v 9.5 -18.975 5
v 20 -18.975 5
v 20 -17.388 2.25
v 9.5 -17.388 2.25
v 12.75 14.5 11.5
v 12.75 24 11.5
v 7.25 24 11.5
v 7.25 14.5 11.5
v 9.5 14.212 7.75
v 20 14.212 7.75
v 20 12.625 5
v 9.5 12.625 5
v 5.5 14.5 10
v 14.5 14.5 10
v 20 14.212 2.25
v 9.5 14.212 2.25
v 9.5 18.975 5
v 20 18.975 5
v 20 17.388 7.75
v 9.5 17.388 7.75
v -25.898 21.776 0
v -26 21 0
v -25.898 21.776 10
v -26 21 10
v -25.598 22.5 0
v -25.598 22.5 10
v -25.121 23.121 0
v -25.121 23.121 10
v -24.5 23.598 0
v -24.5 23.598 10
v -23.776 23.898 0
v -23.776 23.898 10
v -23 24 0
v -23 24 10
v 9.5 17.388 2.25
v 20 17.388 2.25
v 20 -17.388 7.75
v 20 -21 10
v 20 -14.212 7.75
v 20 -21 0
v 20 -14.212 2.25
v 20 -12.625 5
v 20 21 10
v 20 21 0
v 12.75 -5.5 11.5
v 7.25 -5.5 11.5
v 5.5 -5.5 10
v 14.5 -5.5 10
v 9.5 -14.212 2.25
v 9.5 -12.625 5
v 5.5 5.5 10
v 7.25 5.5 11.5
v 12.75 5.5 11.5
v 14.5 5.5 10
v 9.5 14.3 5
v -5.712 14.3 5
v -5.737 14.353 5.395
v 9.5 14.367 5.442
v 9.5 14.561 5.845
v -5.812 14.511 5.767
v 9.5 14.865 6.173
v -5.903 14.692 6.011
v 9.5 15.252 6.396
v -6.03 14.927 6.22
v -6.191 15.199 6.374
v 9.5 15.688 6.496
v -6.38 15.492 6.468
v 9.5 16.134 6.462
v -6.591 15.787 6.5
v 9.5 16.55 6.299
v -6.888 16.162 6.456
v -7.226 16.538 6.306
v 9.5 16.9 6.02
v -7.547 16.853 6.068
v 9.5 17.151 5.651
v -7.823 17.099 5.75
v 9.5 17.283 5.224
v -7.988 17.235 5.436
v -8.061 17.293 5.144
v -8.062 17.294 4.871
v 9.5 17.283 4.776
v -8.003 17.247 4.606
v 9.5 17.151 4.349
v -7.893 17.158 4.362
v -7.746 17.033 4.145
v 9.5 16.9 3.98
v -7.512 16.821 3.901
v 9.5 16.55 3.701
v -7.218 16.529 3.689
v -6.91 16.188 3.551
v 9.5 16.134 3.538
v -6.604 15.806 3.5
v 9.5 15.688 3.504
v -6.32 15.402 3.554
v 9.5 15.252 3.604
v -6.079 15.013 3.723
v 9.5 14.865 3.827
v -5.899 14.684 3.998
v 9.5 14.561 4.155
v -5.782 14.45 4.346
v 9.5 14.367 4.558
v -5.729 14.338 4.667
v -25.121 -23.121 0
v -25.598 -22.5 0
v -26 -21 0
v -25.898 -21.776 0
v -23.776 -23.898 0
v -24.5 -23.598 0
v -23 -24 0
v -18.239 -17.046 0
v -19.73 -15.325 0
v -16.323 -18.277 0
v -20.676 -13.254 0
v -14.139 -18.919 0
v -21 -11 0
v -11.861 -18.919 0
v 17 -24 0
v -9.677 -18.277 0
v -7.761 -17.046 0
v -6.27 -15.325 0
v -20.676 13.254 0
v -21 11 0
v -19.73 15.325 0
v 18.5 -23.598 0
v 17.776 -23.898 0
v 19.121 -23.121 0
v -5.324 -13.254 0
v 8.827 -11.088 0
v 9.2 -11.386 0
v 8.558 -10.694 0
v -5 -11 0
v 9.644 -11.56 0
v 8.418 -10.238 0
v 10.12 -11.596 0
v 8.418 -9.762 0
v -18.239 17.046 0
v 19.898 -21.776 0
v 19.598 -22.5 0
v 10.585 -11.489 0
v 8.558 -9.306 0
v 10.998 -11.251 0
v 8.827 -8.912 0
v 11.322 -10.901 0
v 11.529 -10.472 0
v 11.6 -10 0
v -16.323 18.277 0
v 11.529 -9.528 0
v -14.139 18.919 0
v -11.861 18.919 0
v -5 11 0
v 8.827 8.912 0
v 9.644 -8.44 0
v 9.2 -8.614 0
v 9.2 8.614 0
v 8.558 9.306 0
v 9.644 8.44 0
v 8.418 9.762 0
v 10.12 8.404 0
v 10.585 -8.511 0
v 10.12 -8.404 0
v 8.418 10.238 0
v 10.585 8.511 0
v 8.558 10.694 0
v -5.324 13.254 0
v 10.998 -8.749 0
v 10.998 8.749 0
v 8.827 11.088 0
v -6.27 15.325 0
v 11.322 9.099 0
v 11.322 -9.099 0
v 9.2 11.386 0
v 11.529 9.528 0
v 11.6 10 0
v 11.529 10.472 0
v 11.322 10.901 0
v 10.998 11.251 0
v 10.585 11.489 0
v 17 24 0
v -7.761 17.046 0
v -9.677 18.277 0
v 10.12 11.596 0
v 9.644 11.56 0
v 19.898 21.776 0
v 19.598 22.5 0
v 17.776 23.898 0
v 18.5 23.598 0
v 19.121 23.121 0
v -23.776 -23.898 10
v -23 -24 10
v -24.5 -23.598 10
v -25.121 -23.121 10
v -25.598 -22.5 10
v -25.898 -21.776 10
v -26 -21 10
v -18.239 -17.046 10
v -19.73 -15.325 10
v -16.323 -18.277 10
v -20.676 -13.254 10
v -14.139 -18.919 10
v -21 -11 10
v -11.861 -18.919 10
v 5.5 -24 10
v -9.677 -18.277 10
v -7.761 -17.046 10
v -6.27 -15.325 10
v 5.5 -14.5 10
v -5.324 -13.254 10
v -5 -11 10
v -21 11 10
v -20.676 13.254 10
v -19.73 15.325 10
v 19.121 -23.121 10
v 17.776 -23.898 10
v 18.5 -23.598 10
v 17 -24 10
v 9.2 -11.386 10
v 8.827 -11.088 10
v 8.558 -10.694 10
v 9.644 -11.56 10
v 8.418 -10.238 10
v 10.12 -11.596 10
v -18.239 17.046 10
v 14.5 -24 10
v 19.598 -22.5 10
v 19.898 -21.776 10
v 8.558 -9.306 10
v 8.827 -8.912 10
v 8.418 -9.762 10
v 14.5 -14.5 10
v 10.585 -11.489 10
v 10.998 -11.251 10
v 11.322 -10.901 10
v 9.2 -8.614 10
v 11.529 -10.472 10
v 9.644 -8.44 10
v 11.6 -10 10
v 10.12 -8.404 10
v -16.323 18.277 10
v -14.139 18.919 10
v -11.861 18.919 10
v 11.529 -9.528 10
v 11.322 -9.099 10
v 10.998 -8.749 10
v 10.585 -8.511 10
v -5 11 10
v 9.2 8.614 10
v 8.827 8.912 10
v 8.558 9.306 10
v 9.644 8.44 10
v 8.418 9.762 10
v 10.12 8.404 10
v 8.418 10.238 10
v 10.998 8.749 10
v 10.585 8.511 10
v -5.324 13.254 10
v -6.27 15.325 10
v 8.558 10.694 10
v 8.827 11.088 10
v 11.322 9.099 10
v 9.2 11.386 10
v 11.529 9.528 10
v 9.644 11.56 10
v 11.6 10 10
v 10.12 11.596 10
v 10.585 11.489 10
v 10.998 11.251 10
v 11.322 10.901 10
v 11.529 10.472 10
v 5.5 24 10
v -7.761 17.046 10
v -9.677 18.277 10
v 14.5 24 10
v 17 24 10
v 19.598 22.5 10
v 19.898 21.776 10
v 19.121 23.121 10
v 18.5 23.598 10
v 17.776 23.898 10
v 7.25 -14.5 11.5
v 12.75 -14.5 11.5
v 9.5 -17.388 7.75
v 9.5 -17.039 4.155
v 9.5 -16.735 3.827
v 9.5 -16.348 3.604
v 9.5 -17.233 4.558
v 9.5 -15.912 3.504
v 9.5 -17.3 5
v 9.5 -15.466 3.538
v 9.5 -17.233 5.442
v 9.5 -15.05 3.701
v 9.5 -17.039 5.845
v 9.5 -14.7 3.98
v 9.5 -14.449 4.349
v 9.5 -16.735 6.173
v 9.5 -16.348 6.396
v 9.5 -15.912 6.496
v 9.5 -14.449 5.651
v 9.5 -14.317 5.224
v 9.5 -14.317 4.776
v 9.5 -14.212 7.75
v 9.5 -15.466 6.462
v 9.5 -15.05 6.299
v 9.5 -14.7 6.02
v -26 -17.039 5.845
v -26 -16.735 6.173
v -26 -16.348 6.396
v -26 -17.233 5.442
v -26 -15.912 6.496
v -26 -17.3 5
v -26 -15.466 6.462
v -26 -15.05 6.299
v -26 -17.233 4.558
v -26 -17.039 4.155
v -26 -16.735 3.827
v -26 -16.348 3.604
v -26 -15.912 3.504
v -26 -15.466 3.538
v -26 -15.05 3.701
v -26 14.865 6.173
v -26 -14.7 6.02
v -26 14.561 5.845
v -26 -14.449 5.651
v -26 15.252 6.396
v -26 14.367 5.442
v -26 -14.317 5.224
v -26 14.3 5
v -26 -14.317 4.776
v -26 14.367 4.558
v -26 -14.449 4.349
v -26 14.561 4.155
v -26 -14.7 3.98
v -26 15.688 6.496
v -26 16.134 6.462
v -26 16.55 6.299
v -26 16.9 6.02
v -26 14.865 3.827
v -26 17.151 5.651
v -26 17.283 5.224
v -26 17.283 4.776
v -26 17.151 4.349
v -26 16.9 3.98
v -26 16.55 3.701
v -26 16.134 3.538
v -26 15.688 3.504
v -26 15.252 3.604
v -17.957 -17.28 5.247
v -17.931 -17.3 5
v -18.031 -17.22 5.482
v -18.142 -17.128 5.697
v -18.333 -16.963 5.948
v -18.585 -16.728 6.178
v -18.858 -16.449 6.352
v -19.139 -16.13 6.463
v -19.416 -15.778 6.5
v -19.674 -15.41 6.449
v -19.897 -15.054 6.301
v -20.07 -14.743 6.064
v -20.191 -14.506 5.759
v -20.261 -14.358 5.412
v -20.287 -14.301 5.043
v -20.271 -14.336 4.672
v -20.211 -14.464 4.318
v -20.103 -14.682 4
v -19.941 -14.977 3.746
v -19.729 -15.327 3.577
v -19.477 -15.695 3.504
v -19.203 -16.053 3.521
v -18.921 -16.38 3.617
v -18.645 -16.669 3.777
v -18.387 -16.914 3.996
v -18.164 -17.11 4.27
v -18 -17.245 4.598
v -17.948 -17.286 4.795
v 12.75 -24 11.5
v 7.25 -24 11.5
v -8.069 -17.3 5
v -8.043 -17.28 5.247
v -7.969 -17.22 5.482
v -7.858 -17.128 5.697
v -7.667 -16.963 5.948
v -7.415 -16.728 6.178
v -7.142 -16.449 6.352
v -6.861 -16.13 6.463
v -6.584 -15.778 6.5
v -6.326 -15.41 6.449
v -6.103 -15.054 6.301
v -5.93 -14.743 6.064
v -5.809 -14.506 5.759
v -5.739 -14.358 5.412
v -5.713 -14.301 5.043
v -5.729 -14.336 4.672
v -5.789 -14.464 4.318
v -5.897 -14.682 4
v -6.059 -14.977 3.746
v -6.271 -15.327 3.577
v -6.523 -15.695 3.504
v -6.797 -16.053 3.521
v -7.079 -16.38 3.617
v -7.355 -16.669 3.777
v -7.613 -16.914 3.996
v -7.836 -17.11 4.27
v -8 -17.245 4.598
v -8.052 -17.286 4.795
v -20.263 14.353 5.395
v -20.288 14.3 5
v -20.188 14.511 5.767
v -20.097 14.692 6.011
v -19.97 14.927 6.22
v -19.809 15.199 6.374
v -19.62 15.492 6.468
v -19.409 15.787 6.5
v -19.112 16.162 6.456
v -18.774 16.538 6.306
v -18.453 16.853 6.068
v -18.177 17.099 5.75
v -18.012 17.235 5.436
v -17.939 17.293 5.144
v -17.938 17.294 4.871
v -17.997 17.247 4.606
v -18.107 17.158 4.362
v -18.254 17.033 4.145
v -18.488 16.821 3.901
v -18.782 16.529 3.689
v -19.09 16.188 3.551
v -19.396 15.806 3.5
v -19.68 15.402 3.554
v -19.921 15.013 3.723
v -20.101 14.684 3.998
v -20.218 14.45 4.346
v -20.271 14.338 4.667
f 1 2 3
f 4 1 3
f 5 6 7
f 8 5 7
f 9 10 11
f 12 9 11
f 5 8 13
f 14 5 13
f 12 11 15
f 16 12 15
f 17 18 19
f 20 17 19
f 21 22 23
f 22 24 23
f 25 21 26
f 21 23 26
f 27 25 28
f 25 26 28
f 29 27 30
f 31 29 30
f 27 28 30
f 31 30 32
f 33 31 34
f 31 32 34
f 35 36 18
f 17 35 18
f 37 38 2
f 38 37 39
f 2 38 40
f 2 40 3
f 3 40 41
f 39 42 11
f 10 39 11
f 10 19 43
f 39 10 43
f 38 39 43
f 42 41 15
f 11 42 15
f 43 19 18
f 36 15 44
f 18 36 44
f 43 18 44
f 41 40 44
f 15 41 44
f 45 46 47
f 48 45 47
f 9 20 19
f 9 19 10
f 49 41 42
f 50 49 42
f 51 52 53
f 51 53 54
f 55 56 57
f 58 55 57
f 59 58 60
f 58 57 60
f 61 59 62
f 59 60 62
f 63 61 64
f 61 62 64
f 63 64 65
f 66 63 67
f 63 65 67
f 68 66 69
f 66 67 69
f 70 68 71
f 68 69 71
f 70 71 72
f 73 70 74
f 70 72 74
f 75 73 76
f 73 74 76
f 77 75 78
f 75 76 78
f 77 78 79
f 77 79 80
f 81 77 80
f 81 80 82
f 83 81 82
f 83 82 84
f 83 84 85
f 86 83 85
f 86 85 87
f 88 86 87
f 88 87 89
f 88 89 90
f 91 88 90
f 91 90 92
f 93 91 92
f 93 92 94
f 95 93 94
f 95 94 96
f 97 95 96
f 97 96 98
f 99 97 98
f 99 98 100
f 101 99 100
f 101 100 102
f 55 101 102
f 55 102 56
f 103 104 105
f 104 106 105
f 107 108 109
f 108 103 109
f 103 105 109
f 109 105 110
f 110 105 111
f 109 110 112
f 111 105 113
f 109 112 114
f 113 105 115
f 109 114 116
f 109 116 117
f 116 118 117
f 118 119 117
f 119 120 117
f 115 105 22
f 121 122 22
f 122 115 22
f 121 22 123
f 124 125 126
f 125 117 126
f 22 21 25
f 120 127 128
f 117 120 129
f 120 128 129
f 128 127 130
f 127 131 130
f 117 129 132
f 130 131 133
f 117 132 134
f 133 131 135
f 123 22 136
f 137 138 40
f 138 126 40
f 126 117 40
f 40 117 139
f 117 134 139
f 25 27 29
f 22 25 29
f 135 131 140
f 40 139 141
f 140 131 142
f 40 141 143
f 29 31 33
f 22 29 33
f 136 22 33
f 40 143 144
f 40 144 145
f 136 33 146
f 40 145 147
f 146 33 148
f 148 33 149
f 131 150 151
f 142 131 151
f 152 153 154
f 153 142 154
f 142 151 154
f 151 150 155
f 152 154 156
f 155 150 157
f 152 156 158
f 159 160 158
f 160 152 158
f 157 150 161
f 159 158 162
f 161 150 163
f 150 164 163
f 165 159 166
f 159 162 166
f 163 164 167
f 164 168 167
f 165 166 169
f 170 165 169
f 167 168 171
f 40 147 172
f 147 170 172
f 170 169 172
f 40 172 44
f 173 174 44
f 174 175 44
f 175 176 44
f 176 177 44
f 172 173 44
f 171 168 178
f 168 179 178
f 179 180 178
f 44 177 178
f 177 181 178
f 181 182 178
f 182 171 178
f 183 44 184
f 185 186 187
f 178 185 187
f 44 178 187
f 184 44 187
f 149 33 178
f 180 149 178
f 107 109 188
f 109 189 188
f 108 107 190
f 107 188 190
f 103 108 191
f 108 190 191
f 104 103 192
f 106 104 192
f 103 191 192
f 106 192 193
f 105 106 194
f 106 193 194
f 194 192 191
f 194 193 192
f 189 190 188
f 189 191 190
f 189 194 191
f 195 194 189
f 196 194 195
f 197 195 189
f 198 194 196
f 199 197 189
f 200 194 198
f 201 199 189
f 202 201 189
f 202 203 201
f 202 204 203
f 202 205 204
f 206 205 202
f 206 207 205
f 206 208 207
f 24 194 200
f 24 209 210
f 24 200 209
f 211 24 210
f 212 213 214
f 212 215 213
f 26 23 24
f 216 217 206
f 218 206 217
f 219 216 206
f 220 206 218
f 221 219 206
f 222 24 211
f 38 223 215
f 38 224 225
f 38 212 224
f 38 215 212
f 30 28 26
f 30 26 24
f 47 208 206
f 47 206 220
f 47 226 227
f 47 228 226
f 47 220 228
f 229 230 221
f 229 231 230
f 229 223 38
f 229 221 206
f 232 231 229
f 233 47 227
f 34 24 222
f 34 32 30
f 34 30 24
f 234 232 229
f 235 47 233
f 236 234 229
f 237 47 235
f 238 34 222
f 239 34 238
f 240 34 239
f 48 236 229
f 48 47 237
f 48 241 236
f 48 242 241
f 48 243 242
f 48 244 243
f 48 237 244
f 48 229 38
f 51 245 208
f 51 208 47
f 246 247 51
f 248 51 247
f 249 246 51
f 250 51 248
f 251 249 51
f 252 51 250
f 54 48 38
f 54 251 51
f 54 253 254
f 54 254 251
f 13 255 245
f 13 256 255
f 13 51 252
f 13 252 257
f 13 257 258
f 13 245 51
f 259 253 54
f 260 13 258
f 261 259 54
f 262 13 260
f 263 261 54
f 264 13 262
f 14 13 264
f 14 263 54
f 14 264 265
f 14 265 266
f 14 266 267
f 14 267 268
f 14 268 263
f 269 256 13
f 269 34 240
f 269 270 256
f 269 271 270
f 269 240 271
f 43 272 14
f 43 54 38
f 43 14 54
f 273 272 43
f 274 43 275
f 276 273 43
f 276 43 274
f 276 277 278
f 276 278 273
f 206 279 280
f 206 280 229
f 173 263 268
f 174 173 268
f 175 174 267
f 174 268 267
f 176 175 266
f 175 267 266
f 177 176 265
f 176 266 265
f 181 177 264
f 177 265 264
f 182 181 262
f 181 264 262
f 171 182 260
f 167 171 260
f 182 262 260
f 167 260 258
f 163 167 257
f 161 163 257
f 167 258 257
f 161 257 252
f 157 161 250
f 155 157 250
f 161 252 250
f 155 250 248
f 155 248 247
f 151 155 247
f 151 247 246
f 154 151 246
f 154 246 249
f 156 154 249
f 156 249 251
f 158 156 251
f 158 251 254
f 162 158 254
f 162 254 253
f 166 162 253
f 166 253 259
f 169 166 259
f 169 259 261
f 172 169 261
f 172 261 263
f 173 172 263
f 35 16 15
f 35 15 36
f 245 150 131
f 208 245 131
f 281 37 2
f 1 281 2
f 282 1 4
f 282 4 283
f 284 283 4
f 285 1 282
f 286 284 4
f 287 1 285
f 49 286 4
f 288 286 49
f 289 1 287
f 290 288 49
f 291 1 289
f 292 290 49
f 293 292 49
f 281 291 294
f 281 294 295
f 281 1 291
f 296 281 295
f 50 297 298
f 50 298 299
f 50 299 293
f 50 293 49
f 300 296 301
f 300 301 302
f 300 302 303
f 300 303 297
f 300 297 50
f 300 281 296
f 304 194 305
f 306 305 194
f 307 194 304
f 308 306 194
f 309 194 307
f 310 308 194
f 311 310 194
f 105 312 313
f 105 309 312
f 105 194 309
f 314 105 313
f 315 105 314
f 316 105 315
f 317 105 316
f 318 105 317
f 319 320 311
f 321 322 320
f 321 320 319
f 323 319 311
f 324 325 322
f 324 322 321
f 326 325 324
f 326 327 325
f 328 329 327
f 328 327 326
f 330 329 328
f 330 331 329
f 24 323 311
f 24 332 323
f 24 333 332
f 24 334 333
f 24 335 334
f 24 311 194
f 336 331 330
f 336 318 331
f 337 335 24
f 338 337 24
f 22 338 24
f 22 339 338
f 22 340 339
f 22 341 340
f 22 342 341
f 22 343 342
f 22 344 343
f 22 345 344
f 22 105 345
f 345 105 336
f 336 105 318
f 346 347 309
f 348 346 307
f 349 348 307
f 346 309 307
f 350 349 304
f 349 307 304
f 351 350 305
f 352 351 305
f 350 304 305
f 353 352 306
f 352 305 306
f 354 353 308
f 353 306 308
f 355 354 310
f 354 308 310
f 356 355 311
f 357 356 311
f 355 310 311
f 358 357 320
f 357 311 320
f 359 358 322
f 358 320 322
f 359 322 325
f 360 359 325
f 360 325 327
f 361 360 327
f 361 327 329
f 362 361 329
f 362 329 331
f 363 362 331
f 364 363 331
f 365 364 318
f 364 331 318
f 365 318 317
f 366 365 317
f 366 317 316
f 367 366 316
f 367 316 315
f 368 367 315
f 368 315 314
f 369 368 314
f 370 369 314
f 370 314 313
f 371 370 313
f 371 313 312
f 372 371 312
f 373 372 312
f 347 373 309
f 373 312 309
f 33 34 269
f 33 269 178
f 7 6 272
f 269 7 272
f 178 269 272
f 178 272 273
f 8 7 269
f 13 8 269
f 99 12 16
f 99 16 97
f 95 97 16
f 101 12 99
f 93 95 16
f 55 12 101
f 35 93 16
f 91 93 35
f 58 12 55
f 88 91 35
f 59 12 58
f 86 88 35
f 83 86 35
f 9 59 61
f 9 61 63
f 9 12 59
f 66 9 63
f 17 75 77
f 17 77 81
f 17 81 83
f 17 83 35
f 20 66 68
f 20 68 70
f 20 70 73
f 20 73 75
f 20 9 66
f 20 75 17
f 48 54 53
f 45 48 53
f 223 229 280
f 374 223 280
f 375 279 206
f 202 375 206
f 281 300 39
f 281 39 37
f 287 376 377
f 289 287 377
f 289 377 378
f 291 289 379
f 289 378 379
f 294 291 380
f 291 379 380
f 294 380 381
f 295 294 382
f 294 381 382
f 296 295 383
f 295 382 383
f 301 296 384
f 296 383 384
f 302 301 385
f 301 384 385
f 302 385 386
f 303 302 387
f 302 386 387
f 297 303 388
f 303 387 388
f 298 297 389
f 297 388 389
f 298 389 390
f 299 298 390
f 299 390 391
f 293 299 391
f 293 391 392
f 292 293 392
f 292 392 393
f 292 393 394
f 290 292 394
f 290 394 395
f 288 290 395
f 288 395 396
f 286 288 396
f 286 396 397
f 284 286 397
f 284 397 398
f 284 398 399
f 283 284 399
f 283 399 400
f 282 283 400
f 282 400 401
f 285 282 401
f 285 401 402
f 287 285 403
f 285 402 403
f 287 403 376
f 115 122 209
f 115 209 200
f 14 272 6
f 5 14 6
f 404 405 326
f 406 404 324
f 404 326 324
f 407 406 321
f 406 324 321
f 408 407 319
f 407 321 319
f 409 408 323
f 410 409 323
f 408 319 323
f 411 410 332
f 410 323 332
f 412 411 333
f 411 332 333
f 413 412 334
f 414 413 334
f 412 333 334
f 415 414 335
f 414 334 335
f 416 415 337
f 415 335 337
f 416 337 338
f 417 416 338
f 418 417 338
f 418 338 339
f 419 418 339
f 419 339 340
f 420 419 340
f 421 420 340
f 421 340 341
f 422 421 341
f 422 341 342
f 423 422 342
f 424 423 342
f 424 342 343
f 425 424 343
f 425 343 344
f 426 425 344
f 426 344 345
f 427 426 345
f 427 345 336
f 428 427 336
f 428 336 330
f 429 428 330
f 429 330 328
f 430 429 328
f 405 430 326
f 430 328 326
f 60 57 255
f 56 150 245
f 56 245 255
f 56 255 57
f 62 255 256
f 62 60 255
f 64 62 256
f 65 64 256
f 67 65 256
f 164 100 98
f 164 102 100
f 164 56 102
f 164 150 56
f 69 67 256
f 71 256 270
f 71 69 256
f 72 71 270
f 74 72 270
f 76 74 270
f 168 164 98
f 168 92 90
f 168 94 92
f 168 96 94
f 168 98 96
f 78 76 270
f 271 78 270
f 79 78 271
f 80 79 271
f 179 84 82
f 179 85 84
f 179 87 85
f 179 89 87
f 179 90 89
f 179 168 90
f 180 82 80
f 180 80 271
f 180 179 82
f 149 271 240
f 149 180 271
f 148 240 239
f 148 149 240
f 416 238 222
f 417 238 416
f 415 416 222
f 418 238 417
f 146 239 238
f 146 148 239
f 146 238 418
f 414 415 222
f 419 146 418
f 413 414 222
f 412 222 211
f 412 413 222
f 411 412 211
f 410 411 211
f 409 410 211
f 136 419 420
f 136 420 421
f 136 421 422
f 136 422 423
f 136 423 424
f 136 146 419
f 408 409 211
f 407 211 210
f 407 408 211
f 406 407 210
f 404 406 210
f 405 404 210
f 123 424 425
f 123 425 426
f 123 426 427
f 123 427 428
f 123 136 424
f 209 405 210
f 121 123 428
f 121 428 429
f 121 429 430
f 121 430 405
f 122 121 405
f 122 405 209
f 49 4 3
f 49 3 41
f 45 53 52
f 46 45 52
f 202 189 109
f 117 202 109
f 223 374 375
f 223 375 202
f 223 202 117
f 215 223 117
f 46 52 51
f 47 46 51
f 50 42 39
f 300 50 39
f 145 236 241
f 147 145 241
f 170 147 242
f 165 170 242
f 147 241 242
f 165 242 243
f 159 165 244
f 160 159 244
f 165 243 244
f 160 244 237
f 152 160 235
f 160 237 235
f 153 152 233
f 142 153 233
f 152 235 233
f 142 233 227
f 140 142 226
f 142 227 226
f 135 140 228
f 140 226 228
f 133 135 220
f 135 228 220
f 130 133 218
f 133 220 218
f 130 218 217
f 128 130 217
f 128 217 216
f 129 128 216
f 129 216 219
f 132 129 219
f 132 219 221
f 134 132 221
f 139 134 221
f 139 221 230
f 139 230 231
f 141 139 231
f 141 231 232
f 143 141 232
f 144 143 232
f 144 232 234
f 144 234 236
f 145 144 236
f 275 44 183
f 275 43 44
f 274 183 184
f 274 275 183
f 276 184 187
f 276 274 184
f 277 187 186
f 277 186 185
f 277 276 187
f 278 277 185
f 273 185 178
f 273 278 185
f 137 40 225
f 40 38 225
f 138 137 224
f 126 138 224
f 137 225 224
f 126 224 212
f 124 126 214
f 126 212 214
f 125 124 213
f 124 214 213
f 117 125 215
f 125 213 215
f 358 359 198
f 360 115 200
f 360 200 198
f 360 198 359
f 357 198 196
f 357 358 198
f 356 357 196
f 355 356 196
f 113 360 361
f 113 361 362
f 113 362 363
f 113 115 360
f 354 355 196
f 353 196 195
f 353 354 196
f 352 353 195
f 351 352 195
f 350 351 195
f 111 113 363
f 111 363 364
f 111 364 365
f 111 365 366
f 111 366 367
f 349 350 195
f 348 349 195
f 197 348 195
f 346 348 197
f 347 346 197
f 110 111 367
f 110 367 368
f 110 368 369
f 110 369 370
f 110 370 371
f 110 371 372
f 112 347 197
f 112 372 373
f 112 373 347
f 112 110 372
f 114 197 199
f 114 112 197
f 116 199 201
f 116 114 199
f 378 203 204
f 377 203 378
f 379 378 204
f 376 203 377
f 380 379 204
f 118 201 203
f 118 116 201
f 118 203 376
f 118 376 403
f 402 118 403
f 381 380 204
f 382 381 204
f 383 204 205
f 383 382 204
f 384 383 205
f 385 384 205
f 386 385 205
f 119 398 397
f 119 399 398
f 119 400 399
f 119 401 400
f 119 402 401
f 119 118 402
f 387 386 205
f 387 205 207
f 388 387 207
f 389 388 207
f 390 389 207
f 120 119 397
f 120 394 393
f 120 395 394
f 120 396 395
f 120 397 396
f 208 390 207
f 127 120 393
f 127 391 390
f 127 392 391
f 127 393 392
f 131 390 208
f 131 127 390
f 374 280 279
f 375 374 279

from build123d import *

# Parameters (mm, degrees)
SKETCH_W        = 46
SKETCH_H        = 48
PAD_DEPTH       = 10
SKETCH001_R     = 1.5
POCKET_DEPTH    = 46.001
SKETCH002_R     = 1.6
POCKET001_DEPTH = 10.001
PAD001_DEPTH    = 48
PAD001_FACE20_R = 1.6
POCKET002_DEPTH = 1.501
SKETCH004_W     = 9
SKETCH004_H     = 9
POCKET003_DEPTH = 1.5
FILLET_R        = 3
POCKET004_DEPTH = 10.5


with BuildPart() as part:
    # Sketch → Pad (new body)
    with BuildSketch(Plane.XY):
        with Locations((-3, 0)):
            Rectangle(SKETCH_W, SKETCH_H)
        with BuildLine():
            ThreePointArc((-5, 11), (-13, 19), (-21, 11))
            Line((-21, 11), (-21, -11))
            ThreePointArc((-21, -11), (-13, -19), (-5, -11))
            Line((-5, 11), (-5, -11))
        make_face(mode=Mode.SUBTRACT)
    extrude(amount=PAD_DEPTH)

    # Sketch001 (on Face2 of Pad) → Pocket (cut, through all)
    with BuildSketch(Plane(origin=(-26, 0, 0), x_dir=(0, -1, 0), z_dir=(-1, 0, 0))):
        with Locations((-15.8, 5)):
            Circle(SKETCH001_R)
        with Locations((15.8, 5)):
            Circle(SKETCH001_R)
    extrude(amount=-POCKET_DEPTH, mode=Mode.SUBTRACT)

    # Sketch002 (on Face5 of Pocket) → Pocket001 (cut, through all)
    with BuildSketch(Plane.XY.offset(10)):
        with Locations((10, 10)):
            Circle(SKETCH002_R)
        with Locations((10, -10)):
            Circle(SKETCH002_R)
    extrude(amount=-POCKET001_DEPTH, mode=Mode.SUBTRACT)

    # Sketch003 (on Face1 of Pocket001) → Pad001 (join)
    with BuildSketch(Plane(origin=(0, 24, 0), x_dir=(-1, 0, 0), z_dir=(0, 1, 0))):
        Polygon((-12.75, 11.5), (-7.25, 11.5), (-5.5, 10), (-14.5, 10), align=None)
    extrude(amount=-PAD001_DEPTH)

    # Pad001 Face20 → Pocket002 (cut, through all)
    with BuildSketch(Plane(origin=(10, 10, 10), x_dir=(0, -1, 0), z_dir=(0, 0, -1))):
        Circle(PAD001_FACE20_R)
    extrude(amount=-POCKET002_DEPTH, mode=Mode.SUBTRACT)

    # Sketch004 (on Face10 of Pocket002) → Pocket003 (cut)
    with BuildSketch(Plane.XY.offset(11.5)):
        with Locations((10, 10)):
            Rectangle(SKETCH004_W, SKETCH004_H)
        with Locations((10, -10)):
            Rectangle(SKETCH004_W, SKETCH004_H)
    extrude(amount=-POCKET003_DEPTH, mode=Mode.SUBTRACT)

    # Fillet
    fillet_edges = [part.edges().sort_by_distance(p)[0] for p in [
        (-26, -24, 5),
        (-26, 24, 5),
        (20, -24, 5),
        (20, 24, 5),
    ]]
    fillet(fillet_edges, radius=FILLET_R)

    # Sketch006 (on Face1 of Fillet) → Pocket004 (cut)
    with BuildSketch(Plane.YZ.offset(20)):
        Polygon((-12.624574, 5), (-14.212287, 7.75), (-17.387713, 7.75), (-18.975426, 5), (-17.387713, 2.25), (-14.212287, 2.25), align=None)
        Polygon((17.387713, 7.75), (14.212287, 7.75), (12.624574, 5), (14.212287, 2.25), (17.387713, 2.25), (18.975426, 5), align=None)
    extrude(amount=-POCKET004_DEPTH, mode=Mode.SUBTRACT)


solid = part.part
